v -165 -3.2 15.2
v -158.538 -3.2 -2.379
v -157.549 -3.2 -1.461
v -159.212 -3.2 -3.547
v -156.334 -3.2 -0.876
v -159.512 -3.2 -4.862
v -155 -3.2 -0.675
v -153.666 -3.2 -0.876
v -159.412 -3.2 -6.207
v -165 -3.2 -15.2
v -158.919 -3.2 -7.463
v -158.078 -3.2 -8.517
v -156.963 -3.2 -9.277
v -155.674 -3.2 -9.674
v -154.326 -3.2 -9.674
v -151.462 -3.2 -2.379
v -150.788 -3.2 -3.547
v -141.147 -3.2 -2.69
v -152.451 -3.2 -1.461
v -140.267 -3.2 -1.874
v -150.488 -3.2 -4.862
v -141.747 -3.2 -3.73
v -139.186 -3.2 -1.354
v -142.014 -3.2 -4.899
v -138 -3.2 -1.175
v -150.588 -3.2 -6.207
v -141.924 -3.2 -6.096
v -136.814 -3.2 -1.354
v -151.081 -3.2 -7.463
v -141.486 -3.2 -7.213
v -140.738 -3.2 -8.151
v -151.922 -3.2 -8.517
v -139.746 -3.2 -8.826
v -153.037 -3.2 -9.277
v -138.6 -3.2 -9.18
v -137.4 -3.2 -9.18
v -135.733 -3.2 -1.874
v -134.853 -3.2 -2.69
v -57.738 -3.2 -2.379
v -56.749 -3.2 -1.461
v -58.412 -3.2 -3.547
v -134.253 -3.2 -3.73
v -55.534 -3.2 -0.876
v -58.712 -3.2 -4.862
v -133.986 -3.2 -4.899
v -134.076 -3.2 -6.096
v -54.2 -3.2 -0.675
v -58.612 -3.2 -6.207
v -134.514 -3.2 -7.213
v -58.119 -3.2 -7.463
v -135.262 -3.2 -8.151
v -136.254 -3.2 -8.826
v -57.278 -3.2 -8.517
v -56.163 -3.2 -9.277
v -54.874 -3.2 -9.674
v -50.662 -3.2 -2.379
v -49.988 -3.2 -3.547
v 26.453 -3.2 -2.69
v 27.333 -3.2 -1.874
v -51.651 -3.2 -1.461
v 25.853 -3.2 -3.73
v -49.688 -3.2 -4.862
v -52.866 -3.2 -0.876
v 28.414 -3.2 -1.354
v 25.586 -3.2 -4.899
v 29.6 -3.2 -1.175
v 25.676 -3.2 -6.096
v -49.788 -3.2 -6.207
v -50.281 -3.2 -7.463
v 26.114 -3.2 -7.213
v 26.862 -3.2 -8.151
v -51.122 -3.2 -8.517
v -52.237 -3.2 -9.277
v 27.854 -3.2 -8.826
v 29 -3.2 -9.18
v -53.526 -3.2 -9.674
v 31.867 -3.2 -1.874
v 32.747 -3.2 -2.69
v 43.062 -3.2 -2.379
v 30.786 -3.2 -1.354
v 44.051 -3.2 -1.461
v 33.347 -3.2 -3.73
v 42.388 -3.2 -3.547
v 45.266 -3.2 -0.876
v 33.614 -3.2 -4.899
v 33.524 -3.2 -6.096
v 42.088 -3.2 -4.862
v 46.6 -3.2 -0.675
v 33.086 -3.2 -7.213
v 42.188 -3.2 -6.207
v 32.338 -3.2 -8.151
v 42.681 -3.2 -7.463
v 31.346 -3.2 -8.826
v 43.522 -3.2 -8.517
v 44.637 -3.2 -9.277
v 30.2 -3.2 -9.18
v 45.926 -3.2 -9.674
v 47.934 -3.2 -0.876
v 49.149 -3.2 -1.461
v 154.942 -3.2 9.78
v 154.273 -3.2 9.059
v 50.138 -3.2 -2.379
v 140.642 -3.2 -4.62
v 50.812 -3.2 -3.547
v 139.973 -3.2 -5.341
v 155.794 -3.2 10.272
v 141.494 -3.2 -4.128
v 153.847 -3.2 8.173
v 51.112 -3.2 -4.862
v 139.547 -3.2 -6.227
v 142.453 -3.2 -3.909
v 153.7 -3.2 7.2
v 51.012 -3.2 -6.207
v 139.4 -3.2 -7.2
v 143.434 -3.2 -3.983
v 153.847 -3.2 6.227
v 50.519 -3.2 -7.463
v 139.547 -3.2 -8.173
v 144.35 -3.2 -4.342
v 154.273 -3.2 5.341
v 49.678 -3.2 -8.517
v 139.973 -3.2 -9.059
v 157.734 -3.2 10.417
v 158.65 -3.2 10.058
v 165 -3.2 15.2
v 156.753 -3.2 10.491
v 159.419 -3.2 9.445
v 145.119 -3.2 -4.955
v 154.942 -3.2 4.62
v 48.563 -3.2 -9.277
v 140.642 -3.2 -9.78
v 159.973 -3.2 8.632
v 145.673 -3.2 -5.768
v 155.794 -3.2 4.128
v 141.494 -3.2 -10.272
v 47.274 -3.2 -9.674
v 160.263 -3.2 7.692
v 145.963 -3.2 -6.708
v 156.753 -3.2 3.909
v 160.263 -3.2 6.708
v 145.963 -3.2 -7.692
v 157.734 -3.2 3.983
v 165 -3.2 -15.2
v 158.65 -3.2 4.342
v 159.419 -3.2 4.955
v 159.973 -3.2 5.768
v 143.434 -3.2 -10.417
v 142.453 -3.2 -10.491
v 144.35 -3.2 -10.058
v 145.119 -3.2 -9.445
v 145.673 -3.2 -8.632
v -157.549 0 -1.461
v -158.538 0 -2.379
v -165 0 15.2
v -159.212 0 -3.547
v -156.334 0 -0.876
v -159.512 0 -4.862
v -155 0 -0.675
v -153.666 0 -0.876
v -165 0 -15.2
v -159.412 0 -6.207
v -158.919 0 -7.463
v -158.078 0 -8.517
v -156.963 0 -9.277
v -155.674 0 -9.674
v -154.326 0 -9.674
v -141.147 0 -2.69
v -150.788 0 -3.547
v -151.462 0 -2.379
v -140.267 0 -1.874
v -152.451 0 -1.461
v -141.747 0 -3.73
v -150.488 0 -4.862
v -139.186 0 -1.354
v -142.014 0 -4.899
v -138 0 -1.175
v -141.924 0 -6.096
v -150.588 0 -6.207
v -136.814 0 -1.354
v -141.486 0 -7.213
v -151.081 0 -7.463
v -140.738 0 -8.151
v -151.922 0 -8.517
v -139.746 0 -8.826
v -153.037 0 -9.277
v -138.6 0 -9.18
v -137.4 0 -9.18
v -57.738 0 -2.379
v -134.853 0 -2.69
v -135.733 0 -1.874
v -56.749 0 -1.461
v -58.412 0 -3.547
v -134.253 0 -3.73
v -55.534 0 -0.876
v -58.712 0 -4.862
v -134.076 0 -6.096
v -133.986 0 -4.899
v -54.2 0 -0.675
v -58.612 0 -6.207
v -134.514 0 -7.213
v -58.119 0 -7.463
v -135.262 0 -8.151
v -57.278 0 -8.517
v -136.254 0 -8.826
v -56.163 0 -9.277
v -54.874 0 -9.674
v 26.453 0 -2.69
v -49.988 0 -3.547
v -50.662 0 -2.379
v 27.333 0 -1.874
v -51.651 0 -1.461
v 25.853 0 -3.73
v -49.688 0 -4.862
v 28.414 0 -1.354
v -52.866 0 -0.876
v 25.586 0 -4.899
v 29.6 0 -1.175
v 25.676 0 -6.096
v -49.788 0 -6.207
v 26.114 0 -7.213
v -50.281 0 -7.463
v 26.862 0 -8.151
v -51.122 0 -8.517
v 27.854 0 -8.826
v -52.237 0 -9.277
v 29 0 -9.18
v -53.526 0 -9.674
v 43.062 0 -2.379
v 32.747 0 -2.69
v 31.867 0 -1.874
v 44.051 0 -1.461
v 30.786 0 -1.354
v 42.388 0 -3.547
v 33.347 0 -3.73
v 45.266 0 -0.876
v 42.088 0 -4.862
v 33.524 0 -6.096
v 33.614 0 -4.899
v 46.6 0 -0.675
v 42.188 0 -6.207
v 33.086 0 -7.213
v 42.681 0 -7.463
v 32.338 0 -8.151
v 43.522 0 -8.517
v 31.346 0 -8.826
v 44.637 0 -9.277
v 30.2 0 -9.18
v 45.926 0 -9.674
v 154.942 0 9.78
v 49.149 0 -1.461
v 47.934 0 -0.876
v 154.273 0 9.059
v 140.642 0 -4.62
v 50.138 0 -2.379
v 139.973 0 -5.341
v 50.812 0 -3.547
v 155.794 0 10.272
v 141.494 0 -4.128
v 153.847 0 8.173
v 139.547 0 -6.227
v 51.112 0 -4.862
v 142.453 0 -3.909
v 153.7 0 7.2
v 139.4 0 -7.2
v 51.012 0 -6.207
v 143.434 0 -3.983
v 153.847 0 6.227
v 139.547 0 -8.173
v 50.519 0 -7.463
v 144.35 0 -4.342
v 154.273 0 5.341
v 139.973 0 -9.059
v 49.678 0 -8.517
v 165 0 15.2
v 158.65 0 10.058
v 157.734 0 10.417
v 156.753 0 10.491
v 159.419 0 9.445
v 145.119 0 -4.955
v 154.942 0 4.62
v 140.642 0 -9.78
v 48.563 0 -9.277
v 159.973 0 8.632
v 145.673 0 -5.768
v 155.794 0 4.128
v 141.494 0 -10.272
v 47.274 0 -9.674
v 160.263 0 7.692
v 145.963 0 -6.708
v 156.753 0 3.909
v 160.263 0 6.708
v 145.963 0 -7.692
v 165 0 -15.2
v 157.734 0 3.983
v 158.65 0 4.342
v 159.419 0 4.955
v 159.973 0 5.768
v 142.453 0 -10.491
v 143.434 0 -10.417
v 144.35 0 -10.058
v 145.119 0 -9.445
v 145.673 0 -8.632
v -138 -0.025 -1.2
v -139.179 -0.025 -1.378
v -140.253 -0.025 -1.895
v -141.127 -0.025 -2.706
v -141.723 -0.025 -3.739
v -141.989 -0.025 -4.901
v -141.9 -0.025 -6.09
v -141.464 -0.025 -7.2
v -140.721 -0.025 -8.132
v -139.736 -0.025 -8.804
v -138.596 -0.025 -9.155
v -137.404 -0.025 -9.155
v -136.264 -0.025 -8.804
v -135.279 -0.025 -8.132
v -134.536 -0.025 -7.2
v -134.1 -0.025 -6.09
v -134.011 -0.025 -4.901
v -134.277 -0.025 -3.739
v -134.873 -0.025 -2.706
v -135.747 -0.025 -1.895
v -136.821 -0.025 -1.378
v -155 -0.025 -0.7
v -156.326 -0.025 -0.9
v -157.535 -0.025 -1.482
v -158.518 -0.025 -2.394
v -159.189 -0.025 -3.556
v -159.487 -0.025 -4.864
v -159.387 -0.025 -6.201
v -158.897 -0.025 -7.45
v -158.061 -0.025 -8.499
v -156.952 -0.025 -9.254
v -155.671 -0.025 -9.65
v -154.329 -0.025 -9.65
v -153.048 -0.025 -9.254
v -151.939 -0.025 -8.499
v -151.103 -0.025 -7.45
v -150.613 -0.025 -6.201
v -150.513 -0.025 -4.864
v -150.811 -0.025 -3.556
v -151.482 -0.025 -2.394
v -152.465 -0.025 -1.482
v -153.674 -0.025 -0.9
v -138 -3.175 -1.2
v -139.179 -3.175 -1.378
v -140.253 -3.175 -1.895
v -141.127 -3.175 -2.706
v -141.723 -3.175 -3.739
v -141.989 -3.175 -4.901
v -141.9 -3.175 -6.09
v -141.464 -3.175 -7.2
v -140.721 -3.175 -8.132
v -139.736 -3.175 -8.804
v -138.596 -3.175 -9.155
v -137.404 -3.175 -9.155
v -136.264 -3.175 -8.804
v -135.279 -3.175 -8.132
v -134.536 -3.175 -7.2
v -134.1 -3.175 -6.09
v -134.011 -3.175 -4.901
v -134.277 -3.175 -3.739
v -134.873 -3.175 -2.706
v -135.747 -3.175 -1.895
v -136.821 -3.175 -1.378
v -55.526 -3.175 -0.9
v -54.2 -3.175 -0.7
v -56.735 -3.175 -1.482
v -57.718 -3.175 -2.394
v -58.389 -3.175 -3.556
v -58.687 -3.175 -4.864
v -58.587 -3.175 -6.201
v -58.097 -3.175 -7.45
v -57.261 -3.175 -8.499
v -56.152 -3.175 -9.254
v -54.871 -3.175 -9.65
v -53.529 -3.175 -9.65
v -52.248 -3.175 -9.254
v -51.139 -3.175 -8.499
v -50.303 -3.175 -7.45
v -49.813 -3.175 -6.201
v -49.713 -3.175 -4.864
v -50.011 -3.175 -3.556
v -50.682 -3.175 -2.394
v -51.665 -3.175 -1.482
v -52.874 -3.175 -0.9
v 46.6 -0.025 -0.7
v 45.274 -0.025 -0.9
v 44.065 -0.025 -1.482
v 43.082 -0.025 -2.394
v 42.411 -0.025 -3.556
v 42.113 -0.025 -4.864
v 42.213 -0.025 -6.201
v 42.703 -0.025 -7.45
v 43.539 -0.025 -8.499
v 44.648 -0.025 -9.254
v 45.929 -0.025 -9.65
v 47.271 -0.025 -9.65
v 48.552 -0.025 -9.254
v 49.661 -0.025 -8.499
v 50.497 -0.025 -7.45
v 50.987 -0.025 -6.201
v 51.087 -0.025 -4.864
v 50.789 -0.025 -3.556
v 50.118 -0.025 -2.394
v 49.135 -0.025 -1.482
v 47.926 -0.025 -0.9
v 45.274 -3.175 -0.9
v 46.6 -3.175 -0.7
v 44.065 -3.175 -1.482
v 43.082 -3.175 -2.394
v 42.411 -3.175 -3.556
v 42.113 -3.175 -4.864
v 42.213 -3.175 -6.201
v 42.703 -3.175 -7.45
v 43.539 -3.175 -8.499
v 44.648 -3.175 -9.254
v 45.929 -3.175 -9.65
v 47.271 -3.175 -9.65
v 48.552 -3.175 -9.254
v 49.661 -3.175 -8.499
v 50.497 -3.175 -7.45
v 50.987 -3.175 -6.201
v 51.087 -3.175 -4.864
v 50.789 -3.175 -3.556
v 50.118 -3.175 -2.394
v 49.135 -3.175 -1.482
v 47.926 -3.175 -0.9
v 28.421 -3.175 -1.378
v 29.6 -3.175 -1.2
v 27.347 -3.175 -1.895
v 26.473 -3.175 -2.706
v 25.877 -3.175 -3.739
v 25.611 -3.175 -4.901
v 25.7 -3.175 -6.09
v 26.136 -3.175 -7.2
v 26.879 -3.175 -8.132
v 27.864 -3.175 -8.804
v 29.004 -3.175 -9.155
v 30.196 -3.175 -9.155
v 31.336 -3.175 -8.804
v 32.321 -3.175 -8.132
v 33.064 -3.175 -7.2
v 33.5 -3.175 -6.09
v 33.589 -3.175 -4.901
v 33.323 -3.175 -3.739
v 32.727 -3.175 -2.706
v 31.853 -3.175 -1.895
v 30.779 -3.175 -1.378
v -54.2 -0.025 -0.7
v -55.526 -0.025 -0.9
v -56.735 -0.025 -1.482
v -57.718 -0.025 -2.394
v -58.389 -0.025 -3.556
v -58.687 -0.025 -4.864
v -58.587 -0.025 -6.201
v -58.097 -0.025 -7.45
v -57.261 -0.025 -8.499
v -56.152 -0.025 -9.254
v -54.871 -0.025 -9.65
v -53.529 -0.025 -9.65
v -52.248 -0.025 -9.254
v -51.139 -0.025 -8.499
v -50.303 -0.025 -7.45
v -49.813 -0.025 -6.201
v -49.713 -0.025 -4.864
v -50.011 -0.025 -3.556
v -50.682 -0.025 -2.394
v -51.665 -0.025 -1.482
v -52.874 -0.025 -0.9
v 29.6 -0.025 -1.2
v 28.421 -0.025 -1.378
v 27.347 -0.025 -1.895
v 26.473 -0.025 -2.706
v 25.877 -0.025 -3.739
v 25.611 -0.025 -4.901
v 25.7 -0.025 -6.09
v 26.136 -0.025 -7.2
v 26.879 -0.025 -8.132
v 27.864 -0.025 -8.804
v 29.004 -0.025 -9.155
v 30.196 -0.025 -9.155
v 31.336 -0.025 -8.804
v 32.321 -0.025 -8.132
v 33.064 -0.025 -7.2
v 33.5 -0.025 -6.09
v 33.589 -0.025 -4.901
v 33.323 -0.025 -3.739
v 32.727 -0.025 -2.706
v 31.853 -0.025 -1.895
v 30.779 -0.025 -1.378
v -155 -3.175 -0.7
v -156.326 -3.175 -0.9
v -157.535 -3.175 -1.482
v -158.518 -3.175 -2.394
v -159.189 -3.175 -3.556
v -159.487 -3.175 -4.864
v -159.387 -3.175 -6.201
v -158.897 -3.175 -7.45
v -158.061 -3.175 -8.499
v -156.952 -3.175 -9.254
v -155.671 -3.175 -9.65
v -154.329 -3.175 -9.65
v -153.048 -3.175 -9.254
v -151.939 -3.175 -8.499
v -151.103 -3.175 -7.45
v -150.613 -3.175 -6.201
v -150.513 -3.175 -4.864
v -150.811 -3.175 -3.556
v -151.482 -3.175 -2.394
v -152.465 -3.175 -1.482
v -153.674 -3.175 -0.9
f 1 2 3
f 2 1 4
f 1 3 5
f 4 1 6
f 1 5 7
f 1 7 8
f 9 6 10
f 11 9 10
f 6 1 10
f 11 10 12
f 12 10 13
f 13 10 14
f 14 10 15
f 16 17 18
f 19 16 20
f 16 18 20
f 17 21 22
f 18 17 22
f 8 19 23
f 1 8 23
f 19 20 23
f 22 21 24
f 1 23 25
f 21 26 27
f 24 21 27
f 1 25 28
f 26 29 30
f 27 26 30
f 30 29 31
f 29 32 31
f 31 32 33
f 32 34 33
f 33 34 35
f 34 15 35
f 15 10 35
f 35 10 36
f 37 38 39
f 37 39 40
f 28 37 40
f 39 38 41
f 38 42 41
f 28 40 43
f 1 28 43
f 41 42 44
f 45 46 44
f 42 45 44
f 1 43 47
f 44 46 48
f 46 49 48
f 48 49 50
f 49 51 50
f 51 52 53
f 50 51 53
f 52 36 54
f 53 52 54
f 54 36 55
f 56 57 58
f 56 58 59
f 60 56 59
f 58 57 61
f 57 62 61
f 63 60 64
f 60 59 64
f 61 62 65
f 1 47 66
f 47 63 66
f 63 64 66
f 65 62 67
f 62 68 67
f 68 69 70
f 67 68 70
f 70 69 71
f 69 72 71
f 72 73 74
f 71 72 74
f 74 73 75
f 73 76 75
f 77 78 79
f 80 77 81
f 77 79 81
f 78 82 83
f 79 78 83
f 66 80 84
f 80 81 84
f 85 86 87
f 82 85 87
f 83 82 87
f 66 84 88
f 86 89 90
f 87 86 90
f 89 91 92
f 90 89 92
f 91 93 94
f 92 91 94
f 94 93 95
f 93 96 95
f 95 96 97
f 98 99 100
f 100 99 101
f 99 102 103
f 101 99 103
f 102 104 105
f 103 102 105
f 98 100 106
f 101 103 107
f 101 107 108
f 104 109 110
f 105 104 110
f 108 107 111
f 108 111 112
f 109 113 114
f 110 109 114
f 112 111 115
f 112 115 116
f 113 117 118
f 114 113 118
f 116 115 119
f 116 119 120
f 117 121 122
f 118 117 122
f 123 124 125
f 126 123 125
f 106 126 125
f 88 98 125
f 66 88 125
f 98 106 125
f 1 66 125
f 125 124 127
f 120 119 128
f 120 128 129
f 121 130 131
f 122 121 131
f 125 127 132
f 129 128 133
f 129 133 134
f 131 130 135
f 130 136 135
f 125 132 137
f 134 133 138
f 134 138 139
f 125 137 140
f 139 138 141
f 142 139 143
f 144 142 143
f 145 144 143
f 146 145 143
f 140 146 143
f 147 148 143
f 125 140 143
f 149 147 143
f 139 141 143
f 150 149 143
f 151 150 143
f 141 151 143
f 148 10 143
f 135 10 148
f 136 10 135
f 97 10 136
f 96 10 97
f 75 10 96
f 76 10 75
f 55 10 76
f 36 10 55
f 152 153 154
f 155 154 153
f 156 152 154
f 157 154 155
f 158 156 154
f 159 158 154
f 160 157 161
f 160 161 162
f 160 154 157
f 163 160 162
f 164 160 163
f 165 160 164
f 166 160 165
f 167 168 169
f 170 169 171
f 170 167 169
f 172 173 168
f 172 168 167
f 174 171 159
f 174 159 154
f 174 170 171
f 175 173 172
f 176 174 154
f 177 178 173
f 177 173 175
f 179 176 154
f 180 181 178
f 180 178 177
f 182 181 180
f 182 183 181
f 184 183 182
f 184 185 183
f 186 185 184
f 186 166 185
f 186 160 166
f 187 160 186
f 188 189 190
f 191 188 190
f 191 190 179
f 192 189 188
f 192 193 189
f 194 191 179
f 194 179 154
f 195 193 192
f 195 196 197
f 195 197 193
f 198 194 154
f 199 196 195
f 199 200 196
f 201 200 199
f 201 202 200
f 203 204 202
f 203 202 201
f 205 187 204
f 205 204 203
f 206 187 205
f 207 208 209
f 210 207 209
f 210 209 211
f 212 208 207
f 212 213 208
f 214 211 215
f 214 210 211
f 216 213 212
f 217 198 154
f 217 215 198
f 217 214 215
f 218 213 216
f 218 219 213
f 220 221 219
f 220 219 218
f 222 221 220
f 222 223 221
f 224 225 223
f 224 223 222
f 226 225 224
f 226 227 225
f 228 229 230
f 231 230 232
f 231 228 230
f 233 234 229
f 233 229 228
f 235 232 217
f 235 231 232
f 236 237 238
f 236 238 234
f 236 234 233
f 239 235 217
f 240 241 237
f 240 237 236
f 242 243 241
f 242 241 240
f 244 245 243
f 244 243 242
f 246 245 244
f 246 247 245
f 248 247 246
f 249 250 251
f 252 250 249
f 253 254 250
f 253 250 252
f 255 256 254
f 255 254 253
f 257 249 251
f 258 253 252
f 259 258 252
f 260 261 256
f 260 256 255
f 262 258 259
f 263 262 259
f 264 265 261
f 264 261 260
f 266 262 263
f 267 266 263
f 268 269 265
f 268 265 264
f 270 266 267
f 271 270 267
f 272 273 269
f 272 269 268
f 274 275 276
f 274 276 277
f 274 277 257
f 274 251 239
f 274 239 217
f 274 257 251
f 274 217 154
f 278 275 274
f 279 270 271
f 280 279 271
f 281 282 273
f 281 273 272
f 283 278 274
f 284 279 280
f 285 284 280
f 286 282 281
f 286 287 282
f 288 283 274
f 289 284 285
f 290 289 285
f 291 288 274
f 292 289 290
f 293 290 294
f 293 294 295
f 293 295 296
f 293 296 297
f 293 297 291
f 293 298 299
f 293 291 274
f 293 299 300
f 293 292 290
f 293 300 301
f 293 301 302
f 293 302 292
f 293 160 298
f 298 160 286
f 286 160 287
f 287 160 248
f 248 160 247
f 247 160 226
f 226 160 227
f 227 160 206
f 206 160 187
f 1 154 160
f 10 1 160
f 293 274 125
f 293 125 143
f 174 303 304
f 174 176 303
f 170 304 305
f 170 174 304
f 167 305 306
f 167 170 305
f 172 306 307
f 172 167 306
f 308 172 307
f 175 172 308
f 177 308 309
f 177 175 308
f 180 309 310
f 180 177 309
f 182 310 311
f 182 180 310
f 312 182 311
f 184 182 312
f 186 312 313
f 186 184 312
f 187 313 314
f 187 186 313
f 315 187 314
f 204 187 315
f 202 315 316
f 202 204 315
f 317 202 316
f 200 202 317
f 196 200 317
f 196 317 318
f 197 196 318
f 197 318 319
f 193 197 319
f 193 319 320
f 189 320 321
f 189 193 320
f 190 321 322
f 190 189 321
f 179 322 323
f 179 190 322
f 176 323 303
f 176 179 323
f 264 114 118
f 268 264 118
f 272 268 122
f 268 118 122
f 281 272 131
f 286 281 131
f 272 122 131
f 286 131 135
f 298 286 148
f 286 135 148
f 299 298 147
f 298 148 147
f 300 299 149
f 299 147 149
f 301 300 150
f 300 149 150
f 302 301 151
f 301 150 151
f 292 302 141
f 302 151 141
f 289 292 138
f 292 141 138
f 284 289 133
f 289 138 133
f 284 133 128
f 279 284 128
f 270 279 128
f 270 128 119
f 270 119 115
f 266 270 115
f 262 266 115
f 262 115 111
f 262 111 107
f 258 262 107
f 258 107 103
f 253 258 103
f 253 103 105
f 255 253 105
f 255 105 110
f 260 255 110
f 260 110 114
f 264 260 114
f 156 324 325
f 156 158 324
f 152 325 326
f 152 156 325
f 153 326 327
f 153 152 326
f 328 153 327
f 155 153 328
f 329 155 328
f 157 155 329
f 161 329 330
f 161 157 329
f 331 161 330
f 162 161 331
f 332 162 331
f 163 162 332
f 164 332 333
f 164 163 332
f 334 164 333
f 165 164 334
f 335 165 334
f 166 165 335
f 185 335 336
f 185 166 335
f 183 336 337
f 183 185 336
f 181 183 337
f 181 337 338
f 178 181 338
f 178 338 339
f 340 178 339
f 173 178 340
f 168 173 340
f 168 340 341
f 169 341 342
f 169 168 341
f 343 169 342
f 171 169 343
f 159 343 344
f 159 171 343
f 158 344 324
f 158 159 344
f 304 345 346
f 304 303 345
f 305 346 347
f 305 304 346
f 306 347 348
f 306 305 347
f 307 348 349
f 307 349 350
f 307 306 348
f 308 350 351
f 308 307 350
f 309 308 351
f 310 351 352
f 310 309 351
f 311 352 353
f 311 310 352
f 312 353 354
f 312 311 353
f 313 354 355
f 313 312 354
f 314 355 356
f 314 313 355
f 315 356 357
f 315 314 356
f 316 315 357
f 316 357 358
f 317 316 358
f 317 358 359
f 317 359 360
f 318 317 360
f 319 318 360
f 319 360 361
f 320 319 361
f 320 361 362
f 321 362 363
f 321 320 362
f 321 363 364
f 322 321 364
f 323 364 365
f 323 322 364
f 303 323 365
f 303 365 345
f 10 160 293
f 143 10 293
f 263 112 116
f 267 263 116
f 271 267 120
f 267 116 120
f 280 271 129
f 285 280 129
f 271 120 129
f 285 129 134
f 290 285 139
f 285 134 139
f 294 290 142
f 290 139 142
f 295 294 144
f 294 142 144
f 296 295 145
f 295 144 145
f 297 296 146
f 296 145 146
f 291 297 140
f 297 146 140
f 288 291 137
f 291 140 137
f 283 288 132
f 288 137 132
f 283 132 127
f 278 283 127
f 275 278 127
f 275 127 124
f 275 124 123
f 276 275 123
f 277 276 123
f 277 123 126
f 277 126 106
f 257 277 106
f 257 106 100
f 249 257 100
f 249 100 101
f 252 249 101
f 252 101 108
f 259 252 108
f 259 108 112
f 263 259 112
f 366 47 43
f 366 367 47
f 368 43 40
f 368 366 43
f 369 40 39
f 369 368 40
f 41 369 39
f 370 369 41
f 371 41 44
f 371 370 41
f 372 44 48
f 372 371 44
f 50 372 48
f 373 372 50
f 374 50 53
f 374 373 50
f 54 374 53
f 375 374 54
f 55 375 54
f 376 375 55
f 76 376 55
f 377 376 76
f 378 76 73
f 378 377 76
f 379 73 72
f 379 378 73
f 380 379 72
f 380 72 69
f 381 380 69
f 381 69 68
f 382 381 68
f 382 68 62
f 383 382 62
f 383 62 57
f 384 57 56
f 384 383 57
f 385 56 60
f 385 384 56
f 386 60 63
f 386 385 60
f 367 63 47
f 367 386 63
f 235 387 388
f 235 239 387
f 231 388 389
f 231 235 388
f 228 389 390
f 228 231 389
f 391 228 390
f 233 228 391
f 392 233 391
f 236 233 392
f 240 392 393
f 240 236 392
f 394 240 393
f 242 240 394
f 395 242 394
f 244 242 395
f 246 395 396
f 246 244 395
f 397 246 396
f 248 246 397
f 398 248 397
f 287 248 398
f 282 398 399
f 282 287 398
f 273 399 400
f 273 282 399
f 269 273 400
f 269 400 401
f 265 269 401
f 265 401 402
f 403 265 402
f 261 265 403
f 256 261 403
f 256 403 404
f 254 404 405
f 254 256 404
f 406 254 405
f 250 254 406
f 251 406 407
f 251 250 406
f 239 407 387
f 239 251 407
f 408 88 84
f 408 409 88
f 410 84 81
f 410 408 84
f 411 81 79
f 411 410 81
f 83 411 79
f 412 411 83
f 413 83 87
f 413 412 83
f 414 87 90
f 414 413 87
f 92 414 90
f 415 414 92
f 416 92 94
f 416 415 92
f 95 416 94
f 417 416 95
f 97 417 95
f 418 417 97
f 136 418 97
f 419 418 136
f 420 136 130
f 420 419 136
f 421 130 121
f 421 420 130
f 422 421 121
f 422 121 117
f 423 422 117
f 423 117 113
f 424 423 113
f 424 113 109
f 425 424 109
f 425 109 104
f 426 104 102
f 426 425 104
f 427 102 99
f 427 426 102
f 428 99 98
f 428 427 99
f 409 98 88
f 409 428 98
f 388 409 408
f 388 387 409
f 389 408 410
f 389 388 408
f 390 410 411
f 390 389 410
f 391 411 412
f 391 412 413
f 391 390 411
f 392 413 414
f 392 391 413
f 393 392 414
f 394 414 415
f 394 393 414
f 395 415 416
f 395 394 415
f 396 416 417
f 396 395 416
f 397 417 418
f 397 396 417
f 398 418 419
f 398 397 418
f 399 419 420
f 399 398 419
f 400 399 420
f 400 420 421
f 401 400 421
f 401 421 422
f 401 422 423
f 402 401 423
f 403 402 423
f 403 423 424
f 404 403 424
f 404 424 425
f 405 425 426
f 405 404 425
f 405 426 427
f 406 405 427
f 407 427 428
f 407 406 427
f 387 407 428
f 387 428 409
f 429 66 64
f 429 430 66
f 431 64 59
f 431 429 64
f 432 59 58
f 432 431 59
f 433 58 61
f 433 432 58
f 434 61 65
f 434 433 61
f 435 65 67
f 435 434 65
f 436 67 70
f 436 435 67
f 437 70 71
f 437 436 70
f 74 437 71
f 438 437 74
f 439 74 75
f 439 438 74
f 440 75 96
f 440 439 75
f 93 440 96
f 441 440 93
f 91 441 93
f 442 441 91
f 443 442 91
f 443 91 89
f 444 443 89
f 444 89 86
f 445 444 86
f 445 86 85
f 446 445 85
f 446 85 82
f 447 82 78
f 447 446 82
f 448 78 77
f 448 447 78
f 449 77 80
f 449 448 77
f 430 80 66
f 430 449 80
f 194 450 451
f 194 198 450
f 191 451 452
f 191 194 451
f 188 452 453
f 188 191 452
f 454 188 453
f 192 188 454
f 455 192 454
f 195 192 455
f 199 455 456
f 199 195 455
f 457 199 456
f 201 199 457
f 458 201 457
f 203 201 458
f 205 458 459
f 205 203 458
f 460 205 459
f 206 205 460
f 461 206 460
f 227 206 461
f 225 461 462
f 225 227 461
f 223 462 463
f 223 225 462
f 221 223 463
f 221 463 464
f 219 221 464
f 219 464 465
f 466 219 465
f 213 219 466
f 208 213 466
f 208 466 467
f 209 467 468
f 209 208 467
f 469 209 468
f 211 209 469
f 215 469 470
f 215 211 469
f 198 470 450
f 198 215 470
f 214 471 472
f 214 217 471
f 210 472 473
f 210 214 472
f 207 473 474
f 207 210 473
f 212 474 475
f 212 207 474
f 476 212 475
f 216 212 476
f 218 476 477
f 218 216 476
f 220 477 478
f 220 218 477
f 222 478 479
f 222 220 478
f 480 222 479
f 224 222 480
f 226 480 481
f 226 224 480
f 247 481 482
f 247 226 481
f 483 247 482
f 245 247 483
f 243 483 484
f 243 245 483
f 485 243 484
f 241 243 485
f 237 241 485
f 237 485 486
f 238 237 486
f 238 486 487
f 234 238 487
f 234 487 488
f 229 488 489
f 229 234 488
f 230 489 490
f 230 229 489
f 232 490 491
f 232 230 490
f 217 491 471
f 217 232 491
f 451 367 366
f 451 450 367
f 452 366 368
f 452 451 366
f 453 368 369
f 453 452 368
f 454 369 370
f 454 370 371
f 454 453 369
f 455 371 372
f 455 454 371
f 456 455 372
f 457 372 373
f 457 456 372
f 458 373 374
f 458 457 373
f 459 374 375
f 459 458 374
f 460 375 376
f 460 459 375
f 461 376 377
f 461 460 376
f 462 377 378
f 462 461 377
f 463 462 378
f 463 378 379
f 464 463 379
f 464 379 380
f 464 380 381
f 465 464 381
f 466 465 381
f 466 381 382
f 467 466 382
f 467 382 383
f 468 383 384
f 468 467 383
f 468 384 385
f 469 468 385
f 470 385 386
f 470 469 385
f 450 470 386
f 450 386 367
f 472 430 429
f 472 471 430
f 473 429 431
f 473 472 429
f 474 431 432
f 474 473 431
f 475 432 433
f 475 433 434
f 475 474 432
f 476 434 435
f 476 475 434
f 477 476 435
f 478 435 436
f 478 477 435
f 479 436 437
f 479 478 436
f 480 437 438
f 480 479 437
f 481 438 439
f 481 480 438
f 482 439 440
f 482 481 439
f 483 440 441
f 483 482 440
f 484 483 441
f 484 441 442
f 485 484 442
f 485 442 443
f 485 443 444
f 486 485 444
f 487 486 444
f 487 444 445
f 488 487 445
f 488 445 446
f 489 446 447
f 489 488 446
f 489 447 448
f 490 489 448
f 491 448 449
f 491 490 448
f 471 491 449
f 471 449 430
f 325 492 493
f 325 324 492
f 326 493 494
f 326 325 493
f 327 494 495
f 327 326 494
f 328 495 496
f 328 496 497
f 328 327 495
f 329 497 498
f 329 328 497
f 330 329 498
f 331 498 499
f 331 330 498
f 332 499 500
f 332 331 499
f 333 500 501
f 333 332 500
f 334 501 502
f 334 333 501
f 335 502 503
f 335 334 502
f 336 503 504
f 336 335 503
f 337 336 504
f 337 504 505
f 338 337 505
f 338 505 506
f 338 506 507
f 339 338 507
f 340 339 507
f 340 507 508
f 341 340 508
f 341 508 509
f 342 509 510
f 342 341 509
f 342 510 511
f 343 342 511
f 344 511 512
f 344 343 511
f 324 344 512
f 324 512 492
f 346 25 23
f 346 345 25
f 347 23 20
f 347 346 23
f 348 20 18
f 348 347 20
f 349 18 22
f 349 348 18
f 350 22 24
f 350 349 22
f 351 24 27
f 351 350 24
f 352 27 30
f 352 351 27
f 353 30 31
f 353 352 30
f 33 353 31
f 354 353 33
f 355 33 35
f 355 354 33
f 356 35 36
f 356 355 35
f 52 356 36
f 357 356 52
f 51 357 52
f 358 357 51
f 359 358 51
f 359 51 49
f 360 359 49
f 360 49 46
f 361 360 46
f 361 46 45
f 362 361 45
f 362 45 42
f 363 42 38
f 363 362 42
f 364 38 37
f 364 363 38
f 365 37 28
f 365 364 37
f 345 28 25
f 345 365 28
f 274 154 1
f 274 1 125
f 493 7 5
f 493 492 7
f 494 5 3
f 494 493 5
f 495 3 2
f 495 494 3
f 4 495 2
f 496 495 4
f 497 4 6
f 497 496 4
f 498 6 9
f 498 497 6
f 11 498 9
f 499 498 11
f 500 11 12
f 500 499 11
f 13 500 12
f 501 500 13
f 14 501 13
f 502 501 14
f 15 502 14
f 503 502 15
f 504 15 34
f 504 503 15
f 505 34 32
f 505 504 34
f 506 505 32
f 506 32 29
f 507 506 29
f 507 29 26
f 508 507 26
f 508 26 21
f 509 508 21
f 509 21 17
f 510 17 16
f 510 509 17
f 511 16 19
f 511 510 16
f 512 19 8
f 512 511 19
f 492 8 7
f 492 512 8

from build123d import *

# Parameters (mm, degrees)
SKETCH1_W                      = 330
SKETCH1_H                      = 30.4
BOSS_EXTRUDE1_DEPTH            = 3.2
M8_CLEARANCE_HOLE1_AT_2_COUNT  = 2
M8_CLEARANCE_HOLE1_AT_2_PITCH  = 201.6
M8_CLEARANCE_HOLE1_AT_3_COUNT  = 2
M8_CLEARANCE_HOLE1_AT_3_PITCH  = 100.8
F_8_0MM_DOWEL_HOLE1_AT_2_COUNT = 2
F_8_0MM_DOWEL_HOLE1_AT_2_PITCH = 167.6
M6_CLEARANCE_HOLE1_D           = 6.6


with BuildPart() as part:
    # Sketch1 → Boss-Extrude1 (new body)
    with BuildSketch(Plane(origin=(0, 0, 0), x_dir=(1, 0, 0), z_dir=(0, 1, 0))):
        Rectangle(SKETCH1_W, SKETCH1_H)
    extrude(amount=-BOSS_EXTRUDE1_DEPTH)

    # Sketch3 → M8 Clearance Hole1 (revolve, cut)
    with BuildSketch(Plane(origin=(-155, 0, -5.2), x_dir=(0, 0, 1), z_dir=(1, 0, 0))):
        Polygon((0, 0), (0, 3.2), (4.525, 3.2), (4.5, 3.175), (4.5, 0.025), (4.525, 0), align=None)
    m8_clearance_hole1 = revolve(axis=Axis((-155, 6.35, -5.2), (0, -1, 0)), mode=Mode.SUBTRACT)

    # M8 Clearance Hole1 at 2: M8 Clearance Hole1 ×2
    with Locations(*[(i * M8_CLEARANCE_HOLE1_AT_2_PITCH, 0, 0) for i in range(1, M8_CLEARANCE_HOLE1_AT_2_COUNT)]):
        add(m8_clearance_hole1, mode=Mode.SUBTRACT)

    # M8 Clearance Hole1 at 3: M8 Clearance Hole1 ×2
    with Locations(*[(i * M8_CLEARANCE_HOLE1_AT_3_PITCH, 0, 0) for i in range(1, M8_CLEARANCE_HOLE1_AT_3_COUNT)]):
        add(m8_clearance_hole1, mode=Mode.SUBTRACT)

    # Sketch5 → Ø8.0mm Dowel Hole1 (revolve, cut)
    with BuildSketch(Plane(origin=(-138, 0, -5.2), x_dir=(0, 0, 1), z_dir=(1, 0, 0))):
        Polygon((0, 0), (0, 3.2), (4.025, 3.2), (4, 3.175), (4, 0.025), (4.025, 0), align=None)
    f_8_0mm_dowel_hole1 = revolve(axis=Axis((-138, 6.35, -5.2), (0, -1, 0)), mode=Mode.SUBTRACT)

    # Ø8.0mm Dowel Hole1 at 2: Ø8.0mm Dowel Hole1 ×2
    with Locations(*[(i * F_8_0MM_DOWEL_HOLE1_AT_2_PITCH, 0, 0) for i in range(1, F_8_0MM_DOWEL_HOLE1_AT_2_COUNT)]):
        add(f_8_0mm_dowel_hole1, mode=Mode.SUBTRACT)

    # M6 Clearance Hole1 (through all)
    with Locations(Plane(origin=(0, 0, 0), x_dir=(1, 0, 0), z_dir=(0, 1, 0))):
        with Locations((142.7, 7.2), (157, -7.2)):
            Hole(M6_CLEARANCE_HOLE1_D / 2)


solid = part.part
